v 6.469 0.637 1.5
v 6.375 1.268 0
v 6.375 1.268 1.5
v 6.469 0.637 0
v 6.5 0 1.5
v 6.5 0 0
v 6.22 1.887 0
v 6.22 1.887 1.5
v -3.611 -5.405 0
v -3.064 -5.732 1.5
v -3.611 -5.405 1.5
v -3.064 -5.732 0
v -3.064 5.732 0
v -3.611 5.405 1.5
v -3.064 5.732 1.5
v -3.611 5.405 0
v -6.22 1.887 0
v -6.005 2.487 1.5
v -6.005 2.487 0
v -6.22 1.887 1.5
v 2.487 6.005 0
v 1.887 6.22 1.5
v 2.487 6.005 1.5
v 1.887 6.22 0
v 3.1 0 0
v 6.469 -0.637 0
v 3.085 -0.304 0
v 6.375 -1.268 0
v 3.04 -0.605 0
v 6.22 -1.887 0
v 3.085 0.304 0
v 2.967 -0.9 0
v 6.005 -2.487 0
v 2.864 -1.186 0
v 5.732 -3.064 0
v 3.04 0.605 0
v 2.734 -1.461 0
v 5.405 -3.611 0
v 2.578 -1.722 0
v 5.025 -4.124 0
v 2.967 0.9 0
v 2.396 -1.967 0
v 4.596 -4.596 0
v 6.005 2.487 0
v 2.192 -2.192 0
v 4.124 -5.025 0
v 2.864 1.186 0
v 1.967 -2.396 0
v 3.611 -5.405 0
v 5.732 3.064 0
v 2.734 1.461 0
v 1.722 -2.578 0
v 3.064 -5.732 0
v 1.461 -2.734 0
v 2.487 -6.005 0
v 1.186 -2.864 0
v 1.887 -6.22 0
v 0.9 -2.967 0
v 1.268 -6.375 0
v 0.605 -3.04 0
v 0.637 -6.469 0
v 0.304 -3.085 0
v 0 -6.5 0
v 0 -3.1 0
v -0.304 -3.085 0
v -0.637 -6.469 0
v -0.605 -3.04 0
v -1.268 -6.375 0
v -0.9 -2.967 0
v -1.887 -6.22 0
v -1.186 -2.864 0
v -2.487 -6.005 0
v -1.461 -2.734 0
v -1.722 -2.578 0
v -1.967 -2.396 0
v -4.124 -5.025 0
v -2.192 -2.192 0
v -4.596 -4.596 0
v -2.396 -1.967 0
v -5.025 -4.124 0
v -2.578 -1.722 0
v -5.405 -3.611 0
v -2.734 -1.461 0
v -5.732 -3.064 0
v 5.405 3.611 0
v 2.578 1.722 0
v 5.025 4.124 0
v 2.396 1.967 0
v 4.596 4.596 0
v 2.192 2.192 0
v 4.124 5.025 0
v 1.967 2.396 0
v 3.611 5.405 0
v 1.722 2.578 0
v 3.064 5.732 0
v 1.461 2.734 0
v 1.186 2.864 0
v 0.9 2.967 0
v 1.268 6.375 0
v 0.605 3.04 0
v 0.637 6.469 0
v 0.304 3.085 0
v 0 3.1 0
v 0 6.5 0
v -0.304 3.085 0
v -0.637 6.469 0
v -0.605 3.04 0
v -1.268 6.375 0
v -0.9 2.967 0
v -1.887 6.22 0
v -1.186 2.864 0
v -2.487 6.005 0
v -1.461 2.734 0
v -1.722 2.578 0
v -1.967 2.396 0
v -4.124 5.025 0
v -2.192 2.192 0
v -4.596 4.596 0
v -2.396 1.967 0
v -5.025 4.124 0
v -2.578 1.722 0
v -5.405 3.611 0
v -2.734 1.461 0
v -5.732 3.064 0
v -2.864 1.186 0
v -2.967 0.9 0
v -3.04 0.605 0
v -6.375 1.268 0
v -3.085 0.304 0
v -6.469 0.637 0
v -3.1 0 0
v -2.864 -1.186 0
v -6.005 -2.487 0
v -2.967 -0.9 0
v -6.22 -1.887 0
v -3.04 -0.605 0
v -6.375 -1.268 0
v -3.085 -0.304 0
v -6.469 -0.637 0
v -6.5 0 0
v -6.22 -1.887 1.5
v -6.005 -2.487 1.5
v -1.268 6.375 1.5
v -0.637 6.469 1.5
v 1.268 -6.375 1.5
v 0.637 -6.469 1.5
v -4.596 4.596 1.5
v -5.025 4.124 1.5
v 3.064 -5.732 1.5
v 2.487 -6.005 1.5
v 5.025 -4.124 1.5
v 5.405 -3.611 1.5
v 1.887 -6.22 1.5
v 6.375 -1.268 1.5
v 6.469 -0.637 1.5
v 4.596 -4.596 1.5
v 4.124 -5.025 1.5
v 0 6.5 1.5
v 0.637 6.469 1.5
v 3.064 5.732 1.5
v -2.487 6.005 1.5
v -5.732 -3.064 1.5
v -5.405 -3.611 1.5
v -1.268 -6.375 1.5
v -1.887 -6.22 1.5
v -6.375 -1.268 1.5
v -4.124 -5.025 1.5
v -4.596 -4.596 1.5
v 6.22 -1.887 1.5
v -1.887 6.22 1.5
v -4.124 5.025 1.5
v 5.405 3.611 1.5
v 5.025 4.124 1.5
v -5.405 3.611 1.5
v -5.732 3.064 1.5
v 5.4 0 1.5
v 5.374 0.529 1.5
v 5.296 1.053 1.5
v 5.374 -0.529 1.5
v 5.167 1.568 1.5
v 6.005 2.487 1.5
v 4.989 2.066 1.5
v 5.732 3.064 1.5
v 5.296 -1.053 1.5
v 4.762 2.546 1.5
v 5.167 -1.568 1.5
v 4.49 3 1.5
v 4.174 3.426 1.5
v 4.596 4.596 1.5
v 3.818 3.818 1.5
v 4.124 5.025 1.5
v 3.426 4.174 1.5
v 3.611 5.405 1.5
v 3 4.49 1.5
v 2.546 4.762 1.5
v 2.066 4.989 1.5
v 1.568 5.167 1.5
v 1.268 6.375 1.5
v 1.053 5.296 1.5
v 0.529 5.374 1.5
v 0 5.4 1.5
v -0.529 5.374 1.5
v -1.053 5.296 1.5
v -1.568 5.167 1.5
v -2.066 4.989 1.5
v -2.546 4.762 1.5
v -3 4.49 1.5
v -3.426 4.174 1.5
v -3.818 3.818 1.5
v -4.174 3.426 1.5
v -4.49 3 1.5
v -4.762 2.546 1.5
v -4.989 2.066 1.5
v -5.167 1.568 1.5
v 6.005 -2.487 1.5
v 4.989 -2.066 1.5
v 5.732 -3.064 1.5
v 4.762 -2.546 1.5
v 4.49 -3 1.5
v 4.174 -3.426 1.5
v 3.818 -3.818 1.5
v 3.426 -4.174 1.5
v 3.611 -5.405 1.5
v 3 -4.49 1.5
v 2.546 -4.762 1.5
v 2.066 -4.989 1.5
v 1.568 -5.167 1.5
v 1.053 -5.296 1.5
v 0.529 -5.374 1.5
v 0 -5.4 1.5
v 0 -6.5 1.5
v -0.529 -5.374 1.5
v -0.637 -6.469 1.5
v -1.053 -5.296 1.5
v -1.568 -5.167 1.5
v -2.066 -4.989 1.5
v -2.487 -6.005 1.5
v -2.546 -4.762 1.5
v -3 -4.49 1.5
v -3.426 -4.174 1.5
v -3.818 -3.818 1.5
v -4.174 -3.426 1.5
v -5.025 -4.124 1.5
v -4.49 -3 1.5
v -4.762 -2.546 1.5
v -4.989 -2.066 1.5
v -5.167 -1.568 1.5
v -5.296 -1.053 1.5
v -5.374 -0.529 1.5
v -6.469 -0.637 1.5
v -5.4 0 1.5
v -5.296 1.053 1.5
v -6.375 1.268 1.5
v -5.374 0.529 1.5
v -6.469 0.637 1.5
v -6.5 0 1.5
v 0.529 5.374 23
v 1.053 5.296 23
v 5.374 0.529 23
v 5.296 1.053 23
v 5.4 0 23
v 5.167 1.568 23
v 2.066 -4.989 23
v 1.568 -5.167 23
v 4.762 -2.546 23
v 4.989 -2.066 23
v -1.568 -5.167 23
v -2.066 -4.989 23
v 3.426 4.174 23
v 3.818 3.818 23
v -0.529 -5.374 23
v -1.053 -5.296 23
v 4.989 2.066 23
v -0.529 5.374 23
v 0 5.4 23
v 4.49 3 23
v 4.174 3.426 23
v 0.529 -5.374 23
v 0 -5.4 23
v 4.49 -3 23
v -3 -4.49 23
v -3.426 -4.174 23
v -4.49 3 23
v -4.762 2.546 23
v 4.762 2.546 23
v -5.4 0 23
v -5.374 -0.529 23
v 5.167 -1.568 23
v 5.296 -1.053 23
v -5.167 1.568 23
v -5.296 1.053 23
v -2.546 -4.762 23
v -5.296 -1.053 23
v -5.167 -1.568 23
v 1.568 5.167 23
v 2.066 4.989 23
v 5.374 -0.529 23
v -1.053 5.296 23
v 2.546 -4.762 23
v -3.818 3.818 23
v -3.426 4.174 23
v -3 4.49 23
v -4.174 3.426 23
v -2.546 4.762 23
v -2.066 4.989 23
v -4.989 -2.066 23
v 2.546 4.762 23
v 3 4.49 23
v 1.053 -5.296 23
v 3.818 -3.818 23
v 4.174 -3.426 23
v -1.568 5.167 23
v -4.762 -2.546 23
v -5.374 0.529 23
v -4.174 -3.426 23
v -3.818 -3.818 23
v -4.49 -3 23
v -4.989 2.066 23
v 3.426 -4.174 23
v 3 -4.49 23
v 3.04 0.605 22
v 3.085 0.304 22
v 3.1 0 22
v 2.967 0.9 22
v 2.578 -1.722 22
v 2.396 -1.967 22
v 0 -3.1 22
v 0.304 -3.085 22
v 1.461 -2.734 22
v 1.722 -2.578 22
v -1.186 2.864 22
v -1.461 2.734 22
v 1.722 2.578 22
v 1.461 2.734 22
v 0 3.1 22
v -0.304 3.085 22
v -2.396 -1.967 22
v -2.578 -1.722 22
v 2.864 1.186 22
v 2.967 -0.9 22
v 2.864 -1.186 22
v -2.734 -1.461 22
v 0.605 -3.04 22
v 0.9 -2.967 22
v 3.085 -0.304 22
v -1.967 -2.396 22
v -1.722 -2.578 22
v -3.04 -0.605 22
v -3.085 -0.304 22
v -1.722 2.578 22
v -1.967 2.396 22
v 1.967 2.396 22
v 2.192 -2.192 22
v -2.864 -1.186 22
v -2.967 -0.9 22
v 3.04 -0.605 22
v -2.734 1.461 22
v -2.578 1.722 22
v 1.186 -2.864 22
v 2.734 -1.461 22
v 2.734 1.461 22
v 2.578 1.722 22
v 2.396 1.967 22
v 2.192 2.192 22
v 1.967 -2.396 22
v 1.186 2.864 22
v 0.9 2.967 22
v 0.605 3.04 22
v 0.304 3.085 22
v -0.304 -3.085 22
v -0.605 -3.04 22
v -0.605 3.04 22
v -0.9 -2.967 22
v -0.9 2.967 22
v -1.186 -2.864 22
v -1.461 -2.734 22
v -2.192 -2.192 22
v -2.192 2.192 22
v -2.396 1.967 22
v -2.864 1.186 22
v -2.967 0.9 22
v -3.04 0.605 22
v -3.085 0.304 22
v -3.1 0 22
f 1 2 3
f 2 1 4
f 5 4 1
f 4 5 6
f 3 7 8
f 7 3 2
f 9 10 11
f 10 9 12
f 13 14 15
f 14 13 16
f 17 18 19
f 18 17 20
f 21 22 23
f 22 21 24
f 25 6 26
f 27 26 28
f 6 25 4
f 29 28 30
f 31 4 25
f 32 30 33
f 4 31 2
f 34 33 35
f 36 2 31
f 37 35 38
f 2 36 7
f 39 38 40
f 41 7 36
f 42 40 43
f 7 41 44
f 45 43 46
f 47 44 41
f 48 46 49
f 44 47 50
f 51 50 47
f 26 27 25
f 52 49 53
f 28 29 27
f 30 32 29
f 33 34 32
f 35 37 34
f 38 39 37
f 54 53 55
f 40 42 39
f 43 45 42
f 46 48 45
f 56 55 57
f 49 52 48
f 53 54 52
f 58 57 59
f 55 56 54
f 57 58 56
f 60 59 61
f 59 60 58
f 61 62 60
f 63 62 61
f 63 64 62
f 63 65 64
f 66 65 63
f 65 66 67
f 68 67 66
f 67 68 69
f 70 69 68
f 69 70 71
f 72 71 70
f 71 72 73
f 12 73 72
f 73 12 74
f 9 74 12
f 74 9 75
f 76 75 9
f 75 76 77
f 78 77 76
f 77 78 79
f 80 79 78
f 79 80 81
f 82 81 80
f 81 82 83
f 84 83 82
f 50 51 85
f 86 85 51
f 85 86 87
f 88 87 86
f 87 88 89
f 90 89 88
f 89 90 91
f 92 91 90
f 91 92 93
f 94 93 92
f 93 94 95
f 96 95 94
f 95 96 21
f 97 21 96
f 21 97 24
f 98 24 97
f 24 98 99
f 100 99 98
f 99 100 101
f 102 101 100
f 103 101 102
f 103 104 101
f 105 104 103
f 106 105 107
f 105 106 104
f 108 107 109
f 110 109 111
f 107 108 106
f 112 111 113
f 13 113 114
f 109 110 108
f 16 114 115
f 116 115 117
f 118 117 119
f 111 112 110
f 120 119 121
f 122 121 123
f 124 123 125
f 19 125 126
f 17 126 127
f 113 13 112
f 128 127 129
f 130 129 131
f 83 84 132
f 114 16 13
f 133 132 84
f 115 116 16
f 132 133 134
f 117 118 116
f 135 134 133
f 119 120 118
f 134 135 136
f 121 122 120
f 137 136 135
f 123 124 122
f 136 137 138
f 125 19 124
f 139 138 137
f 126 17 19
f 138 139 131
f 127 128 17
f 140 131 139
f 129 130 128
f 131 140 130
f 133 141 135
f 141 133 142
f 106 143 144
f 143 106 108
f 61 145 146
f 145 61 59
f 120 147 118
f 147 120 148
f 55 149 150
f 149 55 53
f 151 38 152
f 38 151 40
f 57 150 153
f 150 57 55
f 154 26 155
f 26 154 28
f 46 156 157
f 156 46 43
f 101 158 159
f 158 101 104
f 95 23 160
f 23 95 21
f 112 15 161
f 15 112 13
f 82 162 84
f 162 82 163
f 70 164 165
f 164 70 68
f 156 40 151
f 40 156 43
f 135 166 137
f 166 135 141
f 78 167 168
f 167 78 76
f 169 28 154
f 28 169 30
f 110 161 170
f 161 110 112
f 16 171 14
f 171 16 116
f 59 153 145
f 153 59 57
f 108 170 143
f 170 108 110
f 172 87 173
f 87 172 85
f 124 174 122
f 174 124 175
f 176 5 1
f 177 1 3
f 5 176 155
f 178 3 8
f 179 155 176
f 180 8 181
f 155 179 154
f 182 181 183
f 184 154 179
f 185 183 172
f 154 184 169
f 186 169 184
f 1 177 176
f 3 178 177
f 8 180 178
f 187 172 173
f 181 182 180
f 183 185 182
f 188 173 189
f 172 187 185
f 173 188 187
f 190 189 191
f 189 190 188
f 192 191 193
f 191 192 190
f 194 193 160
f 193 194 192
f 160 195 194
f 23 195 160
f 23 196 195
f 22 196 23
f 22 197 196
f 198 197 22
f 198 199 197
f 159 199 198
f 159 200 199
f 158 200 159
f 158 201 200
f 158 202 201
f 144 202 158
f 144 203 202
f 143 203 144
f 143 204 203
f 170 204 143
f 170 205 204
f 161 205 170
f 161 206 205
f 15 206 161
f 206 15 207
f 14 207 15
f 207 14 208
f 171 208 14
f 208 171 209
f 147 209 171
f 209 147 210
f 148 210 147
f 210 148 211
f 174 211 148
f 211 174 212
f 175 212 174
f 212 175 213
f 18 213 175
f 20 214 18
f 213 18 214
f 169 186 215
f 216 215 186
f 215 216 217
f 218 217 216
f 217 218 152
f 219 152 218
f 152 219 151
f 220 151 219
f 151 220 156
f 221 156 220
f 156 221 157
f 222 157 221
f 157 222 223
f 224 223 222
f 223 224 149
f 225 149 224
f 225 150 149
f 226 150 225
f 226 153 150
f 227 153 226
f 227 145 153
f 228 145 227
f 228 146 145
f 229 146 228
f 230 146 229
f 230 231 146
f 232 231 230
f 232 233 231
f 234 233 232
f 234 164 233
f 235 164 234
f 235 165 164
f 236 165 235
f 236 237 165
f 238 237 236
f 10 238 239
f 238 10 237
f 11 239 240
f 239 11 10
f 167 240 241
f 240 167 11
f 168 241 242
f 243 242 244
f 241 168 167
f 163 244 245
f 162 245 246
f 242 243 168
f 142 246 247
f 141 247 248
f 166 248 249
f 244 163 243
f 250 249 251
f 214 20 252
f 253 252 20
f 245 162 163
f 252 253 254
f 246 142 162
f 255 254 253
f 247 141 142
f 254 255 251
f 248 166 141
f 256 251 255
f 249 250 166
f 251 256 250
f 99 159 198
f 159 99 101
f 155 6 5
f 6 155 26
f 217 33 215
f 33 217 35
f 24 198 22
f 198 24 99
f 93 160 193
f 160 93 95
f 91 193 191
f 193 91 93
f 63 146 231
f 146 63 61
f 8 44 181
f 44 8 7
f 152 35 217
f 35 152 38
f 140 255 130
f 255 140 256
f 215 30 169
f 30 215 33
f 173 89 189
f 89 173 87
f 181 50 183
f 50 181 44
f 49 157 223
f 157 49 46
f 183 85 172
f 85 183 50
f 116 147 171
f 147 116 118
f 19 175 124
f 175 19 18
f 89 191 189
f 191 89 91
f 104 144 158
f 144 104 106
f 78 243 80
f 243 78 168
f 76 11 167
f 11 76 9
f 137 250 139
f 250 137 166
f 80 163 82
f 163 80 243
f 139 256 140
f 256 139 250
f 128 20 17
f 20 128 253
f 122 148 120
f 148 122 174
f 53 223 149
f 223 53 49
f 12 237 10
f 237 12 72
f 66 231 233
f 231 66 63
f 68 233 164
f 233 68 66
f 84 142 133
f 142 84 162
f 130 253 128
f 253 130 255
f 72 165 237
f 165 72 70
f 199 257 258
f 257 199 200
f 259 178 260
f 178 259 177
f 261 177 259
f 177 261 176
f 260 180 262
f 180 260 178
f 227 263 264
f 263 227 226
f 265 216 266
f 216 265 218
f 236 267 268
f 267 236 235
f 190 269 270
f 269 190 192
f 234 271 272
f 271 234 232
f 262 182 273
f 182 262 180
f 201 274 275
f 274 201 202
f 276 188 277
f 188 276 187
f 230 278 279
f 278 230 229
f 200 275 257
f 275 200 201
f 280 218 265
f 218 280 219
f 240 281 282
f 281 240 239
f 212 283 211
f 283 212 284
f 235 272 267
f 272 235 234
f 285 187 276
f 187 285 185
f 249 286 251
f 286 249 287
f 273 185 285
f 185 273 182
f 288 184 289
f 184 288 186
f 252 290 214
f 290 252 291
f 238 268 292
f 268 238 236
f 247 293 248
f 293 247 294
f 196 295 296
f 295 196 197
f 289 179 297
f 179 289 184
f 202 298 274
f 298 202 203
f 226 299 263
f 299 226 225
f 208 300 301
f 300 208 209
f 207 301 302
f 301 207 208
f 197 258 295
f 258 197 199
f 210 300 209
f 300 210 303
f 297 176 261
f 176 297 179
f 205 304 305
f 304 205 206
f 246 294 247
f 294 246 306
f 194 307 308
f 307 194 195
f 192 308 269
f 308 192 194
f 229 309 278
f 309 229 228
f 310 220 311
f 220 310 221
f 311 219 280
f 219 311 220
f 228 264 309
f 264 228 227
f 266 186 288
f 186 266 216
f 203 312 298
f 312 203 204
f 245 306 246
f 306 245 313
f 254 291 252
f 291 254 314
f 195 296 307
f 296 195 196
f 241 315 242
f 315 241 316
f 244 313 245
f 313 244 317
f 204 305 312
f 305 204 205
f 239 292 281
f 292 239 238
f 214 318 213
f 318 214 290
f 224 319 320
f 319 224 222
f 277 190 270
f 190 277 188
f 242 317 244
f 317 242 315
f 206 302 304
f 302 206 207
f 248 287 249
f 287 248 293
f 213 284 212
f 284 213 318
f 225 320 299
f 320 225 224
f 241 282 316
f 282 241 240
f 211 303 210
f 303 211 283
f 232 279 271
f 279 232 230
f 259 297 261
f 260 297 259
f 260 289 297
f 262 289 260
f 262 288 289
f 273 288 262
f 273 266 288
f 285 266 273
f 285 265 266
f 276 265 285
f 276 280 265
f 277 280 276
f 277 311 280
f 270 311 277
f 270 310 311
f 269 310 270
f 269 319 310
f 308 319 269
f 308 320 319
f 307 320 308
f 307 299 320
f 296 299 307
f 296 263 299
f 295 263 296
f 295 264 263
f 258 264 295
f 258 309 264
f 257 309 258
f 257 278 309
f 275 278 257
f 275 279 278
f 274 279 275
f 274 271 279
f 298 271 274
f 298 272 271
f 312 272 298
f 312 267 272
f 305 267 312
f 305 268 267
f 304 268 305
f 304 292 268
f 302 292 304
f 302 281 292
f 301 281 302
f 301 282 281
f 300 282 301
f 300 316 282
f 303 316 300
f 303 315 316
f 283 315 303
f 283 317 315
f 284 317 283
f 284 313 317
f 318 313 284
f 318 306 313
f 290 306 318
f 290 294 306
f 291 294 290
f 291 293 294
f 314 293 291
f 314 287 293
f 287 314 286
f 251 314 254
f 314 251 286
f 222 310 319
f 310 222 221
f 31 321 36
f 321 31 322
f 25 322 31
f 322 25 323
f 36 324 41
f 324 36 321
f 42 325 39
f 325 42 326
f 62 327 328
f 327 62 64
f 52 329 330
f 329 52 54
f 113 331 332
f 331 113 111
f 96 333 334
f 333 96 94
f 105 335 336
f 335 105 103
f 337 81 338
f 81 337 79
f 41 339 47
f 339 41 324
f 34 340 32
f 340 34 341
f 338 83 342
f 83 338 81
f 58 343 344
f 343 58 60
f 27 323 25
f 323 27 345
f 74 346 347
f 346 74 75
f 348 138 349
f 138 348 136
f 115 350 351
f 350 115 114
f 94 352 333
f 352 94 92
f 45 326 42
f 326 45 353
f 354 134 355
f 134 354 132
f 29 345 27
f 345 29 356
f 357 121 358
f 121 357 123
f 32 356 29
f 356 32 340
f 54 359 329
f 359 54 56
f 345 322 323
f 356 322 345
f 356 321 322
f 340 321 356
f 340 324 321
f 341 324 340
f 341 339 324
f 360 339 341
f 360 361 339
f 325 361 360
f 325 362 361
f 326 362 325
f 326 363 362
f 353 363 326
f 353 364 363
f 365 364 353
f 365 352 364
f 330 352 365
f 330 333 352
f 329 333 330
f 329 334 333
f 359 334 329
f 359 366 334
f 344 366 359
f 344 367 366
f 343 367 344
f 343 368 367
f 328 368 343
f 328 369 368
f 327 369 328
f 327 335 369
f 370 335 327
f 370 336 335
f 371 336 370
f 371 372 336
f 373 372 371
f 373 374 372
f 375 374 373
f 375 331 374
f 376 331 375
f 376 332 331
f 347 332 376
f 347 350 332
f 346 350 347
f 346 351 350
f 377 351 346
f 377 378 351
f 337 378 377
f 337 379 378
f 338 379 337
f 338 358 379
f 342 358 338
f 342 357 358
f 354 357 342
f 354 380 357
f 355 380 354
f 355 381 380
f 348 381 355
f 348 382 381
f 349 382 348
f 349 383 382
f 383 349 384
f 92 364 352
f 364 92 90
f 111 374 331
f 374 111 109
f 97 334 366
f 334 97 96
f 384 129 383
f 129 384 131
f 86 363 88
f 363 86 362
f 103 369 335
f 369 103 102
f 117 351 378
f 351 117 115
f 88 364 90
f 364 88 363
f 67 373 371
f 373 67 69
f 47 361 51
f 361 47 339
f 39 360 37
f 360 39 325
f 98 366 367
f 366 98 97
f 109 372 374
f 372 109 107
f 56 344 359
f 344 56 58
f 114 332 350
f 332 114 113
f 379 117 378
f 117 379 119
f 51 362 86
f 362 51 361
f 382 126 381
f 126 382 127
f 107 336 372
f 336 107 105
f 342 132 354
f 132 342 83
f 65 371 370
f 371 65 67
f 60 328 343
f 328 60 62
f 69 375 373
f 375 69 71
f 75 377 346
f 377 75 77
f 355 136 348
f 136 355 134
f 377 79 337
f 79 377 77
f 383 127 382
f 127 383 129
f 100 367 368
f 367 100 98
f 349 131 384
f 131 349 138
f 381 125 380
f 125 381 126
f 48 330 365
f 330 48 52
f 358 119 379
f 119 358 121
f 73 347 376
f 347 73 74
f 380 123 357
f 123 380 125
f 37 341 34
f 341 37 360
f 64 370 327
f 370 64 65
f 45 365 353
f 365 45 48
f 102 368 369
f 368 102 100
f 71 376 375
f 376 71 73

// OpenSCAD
// Adapter sleeve: 0.2 mL PCR tube in a 1.5 mL rack hole
// Print orientation: collar down on the bed (z = 0), sleeve up to z = 21.5

$fn = 64;

// --- Dimensions (mm) ---
collar_d      = 13;    // collar diameter (contact with bed)
collar_t      = 1.5;   // collar thickness
sleeve_od     = 10.8;  // sleeve outer diameter
sleeve_h      = 21.5;  // total height of sleeve body (top of sleeve)
bore_d        = 6.2;   // through-bore diameter
eps           = 0.5;   // cutter overshoot past faces

difference() {
    union() {
        // Collar
        cylinder(d = collar_d, h = collar_t);
        // Sleeve body (overlaps collar slightly for a clean union)
        translate([0, 0, collar_t - 0.01])
            cylinder(d = sleeve_od, h = sleeve_h + 0.01);
    }
    // Full-height bore, open at both ends
    translate([0, 0, -eps])
        cylinder(d = bore_d, h = sleeve_h + 2 * eps);
}
